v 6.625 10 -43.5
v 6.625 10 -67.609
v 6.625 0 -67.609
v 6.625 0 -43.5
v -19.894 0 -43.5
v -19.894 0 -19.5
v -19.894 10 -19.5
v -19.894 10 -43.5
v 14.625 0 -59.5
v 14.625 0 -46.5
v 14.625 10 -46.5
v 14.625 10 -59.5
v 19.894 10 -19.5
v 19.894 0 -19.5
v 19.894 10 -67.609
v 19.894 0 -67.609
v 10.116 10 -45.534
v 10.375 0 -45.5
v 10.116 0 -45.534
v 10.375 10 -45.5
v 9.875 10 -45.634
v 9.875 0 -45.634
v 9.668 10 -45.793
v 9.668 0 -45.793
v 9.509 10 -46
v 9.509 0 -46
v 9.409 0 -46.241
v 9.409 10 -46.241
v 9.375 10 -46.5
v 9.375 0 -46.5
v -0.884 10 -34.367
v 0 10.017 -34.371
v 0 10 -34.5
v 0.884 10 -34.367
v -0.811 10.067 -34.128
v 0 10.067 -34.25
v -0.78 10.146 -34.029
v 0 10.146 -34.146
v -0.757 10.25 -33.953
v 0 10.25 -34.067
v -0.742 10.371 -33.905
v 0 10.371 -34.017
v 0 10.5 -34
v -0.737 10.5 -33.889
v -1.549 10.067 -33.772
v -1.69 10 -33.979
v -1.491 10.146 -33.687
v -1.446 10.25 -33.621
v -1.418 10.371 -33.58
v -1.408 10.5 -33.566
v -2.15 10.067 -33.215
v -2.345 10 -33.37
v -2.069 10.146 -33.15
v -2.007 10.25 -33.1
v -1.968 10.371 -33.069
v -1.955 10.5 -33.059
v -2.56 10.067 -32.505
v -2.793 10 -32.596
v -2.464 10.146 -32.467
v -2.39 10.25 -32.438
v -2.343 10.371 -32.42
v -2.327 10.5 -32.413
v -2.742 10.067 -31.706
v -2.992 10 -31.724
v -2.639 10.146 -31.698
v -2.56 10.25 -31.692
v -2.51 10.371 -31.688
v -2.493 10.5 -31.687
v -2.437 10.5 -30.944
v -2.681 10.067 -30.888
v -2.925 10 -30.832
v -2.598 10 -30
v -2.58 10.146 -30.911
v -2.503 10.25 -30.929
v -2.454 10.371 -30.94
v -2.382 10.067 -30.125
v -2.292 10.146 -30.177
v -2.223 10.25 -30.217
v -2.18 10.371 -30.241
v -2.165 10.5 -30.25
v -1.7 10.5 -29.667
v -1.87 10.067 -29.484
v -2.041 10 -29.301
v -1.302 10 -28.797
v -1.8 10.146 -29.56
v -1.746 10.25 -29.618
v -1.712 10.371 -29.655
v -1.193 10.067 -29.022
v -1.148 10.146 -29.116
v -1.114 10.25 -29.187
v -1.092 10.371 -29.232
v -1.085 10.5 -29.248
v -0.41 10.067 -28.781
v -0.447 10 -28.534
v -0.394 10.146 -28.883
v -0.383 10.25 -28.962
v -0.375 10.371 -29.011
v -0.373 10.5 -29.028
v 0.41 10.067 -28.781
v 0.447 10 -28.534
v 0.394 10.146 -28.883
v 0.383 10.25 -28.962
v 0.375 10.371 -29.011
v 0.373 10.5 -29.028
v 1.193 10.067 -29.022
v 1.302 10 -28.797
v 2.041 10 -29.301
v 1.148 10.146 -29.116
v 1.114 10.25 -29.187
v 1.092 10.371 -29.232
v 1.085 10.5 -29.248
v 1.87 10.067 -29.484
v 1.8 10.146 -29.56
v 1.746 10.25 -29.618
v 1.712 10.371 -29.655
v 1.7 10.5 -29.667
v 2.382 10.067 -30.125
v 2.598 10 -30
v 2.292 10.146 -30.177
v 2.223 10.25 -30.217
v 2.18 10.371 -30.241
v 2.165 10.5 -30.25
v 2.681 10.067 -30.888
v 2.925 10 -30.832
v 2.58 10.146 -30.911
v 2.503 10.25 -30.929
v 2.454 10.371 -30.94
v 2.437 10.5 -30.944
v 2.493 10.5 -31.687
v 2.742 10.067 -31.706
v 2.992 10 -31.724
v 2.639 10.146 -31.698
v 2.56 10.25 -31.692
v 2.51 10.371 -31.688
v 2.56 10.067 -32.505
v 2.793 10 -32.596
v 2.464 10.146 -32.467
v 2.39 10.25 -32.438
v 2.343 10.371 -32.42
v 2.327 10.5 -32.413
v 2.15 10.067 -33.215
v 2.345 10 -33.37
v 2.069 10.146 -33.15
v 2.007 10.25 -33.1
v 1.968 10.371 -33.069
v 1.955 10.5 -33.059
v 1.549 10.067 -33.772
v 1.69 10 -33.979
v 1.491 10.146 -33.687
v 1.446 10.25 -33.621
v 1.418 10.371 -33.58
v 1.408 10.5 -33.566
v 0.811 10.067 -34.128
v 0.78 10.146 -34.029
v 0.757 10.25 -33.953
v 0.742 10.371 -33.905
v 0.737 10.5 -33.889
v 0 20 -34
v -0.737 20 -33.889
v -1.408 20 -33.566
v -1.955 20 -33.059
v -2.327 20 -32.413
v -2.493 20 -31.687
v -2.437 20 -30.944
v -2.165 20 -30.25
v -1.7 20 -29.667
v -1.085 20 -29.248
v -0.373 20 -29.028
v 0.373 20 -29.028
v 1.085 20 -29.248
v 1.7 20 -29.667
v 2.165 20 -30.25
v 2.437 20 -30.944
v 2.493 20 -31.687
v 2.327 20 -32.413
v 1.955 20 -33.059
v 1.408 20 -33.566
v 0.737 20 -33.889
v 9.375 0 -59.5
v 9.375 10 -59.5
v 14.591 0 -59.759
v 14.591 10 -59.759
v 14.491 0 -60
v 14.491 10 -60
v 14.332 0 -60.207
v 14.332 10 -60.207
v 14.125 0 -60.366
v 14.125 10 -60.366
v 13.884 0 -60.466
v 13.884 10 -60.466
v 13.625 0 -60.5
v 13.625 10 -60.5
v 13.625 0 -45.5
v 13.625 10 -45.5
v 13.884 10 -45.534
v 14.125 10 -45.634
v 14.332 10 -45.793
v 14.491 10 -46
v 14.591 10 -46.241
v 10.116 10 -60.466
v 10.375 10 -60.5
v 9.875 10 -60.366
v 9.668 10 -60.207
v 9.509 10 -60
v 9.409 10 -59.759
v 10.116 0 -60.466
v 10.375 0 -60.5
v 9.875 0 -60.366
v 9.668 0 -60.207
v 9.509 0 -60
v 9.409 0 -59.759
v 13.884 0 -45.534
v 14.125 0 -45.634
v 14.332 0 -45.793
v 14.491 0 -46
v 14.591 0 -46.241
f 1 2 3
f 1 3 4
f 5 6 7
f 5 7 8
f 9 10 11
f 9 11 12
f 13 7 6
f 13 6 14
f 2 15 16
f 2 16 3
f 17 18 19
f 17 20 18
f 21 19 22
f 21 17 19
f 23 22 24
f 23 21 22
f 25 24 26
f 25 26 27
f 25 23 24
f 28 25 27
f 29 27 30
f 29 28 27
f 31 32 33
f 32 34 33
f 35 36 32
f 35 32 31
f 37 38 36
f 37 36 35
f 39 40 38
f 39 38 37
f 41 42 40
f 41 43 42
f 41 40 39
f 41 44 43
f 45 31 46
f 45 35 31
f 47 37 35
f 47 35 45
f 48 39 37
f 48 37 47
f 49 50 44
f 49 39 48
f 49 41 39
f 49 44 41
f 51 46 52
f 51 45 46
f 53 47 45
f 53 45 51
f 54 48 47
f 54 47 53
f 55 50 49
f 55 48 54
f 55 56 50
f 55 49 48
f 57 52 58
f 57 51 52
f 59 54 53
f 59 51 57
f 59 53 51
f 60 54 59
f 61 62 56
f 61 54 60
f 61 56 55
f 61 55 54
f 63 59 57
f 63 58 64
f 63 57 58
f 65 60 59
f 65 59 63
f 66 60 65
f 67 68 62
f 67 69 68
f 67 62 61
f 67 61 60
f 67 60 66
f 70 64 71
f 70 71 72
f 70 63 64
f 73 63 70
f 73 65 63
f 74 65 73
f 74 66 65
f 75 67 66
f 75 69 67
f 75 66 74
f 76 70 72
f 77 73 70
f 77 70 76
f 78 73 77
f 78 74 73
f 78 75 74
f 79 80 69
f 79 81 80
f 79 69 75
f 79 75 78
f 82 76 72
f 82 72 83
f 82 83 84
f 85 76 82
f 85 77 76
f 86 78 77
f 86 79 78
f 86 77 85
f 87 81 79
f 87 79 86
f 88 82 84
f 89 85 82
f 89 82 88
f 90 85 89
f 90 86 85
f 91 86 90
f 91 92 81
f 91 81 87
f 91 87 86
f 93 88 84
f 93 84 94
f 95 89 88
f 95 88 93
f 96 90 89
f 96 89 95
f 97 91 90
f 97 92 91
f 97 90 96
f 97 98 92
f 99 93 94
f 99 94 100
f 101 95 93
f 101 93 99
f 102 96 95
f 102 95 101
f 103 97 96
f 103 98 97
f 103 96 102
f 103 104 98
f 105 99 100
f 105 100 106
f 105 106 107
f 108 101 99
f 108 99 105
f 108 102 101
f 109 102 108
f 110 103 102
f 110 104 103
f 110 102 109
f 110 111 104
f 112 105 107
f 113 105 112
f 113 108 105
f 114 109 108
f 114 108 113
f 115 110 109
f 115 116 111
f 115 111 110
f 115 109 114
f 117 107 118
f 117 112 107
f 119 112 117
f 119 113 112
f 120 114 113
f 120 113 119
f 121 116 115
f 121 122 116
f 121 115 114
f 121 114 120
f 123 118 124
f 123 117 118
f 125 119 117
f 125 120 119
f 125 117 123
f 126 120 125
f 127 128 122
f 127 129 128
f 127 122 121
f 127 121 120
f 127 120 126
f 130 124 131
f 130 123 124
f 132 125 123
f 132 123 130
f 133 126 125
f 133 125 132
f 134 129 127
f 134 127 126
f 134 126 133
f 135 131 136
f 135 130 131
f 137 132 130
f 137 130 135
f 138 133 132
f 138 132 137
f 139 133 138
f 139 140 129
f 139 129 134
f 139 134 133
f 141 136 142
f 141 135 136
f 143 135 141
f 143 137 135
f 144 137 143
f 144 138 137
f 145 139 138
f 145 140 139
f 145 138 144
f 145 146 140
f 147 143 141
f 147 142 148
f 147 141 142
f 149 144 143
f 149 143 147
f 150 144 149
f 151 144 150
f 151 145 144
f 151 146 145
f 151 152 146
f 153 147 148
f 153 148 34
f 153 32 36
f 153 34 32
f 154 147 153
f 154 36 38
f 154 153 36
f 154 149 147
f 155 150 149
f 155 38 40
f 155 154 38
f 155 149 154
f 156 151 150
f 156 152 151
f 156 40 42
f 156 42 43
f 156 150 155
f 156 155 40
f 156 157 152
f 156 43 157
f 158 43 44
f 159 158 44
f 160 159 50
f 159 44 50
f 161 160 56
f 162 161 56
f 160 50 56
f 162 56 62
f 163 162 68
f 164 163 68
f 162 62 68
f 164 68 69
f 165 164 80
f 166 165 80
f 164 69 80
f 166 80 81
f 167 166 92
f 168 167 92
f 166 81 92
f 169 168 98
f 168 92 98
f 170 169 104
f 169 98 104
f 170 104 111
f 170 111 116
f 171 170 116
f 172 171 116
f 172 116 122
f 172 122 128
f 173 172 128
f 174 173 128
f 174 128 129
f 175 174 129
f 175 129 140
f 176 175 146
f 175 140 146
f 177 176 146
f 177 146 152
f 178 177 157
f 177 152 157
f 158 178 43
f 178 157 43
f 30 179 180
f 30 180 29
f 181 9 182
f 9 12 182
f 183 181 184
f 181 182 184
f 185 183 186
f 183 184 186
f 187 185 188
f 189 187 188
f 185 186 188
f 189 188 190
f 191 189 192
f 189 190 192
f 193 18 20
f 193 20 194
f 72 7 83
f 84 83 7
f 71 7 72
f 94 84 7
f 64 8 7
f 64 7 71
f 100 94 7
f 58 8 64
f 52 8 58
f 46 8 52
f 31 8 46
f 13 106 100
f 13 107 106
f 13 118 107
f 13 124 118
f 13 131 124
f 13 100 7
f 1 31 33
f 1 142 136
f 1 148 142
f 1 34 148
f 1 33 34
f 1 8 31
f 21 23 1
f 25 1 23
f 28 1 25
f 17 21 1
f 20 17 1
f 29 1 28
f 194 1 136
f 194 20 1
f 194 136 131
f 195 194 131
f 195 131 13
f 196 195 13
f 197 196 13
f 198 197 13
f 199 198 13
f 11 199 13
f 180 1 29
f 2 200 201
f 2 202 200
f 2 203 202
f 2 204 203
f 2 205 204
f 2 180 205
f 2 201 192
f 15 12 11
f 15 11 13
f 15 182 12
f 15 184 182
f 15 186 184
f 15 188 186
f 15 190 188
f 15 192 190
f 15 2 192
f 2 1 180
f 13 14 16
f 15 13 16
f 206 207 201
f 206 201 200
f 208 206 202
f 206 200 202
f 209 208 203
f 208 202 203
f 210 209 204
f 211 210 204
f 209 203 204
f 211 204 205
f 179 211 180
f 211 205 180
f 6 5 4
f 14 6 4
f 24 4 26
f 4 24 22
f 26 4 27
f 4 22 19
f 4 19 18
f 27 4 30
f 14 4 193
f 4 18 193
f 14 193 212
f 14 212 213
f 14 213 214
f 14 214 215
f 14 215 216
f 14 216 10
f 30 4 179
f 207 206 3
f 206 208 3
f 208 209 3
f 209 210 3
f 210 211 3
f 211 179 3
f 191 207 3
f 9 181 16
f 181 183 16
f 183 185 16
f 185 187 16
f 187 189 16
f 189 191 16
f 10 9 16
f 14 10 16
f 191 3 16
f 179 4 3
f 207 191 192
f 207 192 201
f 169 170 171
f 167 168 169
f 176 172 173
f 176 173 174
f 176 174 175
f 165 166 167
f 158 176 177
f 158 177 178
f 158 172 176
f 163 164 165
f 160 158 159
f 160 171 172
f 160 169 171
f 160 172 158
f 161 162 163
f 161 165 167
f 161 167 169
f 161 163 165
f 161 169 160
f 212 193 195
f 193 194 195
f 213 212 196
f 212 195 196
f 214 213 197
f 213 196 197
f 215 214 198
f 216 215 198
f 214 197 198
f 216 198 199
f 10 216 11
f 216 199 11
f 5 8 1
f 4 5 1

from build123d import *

# Parameters (mm, degrees)
BOSS_EXTRUDE1_DEPTH  = 10
FILLET2_R            = 1
FILLET2_OF_MIRROR1_R = 1
CUT_EXTRUDE1_DEPTH   = 81.635062113
FILLET3_R            = 1
SKETCH5_R            = 2.5
BOSS_EXTRUDE2_DEPTH  = 10
FILLET1_R            = 0.5
SKETCH6_W            = 39.78759817
SKETCH6_H            = 34
CUT_EXTRUDE2_DEPTH   = 10


with BuildPart() as part:
    # Sketch2 → Boss-Extrude1 (new body)
    with BuildSketch(Plane(origin=(0, 0, 0), x_dir=(1, 0, 0), z_dir=(0, 1, 0))):
        Polygon((-19.893799085, 77.5), (0, 77.5), (0, 75.5), (-2.625, 75.5), (-2.625, 73), (-2.625, 63), (-2.625, 60.5), (0, 60.5), (0, 60.375), (0, 2.5), (-2.625, 2.5), (-2.625, 0), (-2.625, -10), (-2.625, -12.5), (0, -12.5), (0, -14.5), (-19.893799085, -14.5), align=None)
    boss_extrude1 = extrude(amount=BOSS_EXTRUDE1_DEPTH)

    # Fillet2
    fillet2_edges = [part.edges().sort_by_distance(p)[0] for p in [
        (-2.625, 5, 12.5),
        (-2.625, 5, -2.5),
        (-2.625, 5, -60.5),
        (-2.625, 5, -75.5),
    ]]
    fillet(fillet2_edges, radius=FILLET2_R)

    # Mirror1: Boss-Extrude1 across Right Plane
    add(boss_extrude1.mirror(Plane(origin=(0, 0, 0), x_dir=(0, 0, -1), z_dir=(1, 0, 0))))

    # Fillet2 of Mirror1
    fillet2_of_mirror1_edges = [part.edges().sort_by_distance(p)[0] for p in [
        (2.625, 5, 12.5),
        (2.625, 5, -2.5),
        (2.625, 5, -60.5),
        (2.625, 5, -75.5),
    ]]
    fillet(fillet2_of_mirror1_edges, radius=FILLET2_OF_MIRROR1_R)

    # Sketch4 → Cut-Extrude1 (cut, through all)
    with BuildSketch(Plane(origin=(0, 0, 0), x_dir=(1, 0, 0), z_dir=(0, 1, 0))):
        Polygon((-14.625, 15), (-14.625, 5), (-14.625, 2.5), (-12, 2.5), (-9.375, 2.5), (-9.375, 5), (-9.375, 15), (-9.375, 17.5), (-12, 17.5), (-14.625, 17.5), align=None)
        Polygon((9.375, 58), (9.375, 48), (9.375, 45.5), (12, 45.5), (14.625, 45.5), (14.625, 48), (14.625, 58), (14.625, 60.5), (12, 60.5), (9.375, 60.5), align=None)
    extrude(amount=CUT_EXTRUDE1_DEPTH, mode=Mode.SUBTRACT)

    # Fillet3
    fillet3_edges = [part.edges().sort_by_distance(p)[0] for p in [
        (-14.625, 5, -17.5),
        (-14.625, 5, -2.5),
        (-9.375, 5, -2.5),
        (-9.375, 5, -17.5),
        (14.625, 5, -60.5),
        (9.375, 5, -60.5),
        (9.375, 5, -45.5),
        (14.625, 5, -45.5),
    ]]
    fillet(fillet3_edges, radius=FILLET3_R)

    # Sketch5 → Boss-Extrude2 (add)
    with BuildSketch(Plane(origin=(0, 10, 0), x_dir=(1, 0, 0), z_dir=(0, 1, 0))):
        with Locations(Location((0, 31.5, 0), (0, 0, 90))):
            Circle(SKETCH5_R)
    extrude(amount=BOSS_EXTRUDE2_DEPTH)

    # Fillet1
    fillet1_edges = [part.edges().sort_by_distance(p)[0] for p in [
        (0, 10, -29),
    ]]
    fillet(fillet1_edges, radius=FILLET1_R)

    # Sketch6 → Cut-Extrude2 (cut)
    with BuildSketch(Plane(origin=(0, 10, 0), x_dir=(1, 0, 0), z_dir=(0, 1, 0))):
        Polygon((19.893799085, 77.5), (19.893799085, 67.609192382), (6.625, 67.609192382), (6.625, 43.5), (-6.625, 43.5), (-19.893799085, 43.5), (-19.893799085, 77.5), (-6.625, 77.5), align=None)
        with Locations((0, 2.5)):
            Rectangle(SKETCH6_W, SKETCH6_H)
    extrude(amount=-CUT_EXTRUDE2_DEPTH, mode=Mode.SUBTRACT)


solid = part.part
